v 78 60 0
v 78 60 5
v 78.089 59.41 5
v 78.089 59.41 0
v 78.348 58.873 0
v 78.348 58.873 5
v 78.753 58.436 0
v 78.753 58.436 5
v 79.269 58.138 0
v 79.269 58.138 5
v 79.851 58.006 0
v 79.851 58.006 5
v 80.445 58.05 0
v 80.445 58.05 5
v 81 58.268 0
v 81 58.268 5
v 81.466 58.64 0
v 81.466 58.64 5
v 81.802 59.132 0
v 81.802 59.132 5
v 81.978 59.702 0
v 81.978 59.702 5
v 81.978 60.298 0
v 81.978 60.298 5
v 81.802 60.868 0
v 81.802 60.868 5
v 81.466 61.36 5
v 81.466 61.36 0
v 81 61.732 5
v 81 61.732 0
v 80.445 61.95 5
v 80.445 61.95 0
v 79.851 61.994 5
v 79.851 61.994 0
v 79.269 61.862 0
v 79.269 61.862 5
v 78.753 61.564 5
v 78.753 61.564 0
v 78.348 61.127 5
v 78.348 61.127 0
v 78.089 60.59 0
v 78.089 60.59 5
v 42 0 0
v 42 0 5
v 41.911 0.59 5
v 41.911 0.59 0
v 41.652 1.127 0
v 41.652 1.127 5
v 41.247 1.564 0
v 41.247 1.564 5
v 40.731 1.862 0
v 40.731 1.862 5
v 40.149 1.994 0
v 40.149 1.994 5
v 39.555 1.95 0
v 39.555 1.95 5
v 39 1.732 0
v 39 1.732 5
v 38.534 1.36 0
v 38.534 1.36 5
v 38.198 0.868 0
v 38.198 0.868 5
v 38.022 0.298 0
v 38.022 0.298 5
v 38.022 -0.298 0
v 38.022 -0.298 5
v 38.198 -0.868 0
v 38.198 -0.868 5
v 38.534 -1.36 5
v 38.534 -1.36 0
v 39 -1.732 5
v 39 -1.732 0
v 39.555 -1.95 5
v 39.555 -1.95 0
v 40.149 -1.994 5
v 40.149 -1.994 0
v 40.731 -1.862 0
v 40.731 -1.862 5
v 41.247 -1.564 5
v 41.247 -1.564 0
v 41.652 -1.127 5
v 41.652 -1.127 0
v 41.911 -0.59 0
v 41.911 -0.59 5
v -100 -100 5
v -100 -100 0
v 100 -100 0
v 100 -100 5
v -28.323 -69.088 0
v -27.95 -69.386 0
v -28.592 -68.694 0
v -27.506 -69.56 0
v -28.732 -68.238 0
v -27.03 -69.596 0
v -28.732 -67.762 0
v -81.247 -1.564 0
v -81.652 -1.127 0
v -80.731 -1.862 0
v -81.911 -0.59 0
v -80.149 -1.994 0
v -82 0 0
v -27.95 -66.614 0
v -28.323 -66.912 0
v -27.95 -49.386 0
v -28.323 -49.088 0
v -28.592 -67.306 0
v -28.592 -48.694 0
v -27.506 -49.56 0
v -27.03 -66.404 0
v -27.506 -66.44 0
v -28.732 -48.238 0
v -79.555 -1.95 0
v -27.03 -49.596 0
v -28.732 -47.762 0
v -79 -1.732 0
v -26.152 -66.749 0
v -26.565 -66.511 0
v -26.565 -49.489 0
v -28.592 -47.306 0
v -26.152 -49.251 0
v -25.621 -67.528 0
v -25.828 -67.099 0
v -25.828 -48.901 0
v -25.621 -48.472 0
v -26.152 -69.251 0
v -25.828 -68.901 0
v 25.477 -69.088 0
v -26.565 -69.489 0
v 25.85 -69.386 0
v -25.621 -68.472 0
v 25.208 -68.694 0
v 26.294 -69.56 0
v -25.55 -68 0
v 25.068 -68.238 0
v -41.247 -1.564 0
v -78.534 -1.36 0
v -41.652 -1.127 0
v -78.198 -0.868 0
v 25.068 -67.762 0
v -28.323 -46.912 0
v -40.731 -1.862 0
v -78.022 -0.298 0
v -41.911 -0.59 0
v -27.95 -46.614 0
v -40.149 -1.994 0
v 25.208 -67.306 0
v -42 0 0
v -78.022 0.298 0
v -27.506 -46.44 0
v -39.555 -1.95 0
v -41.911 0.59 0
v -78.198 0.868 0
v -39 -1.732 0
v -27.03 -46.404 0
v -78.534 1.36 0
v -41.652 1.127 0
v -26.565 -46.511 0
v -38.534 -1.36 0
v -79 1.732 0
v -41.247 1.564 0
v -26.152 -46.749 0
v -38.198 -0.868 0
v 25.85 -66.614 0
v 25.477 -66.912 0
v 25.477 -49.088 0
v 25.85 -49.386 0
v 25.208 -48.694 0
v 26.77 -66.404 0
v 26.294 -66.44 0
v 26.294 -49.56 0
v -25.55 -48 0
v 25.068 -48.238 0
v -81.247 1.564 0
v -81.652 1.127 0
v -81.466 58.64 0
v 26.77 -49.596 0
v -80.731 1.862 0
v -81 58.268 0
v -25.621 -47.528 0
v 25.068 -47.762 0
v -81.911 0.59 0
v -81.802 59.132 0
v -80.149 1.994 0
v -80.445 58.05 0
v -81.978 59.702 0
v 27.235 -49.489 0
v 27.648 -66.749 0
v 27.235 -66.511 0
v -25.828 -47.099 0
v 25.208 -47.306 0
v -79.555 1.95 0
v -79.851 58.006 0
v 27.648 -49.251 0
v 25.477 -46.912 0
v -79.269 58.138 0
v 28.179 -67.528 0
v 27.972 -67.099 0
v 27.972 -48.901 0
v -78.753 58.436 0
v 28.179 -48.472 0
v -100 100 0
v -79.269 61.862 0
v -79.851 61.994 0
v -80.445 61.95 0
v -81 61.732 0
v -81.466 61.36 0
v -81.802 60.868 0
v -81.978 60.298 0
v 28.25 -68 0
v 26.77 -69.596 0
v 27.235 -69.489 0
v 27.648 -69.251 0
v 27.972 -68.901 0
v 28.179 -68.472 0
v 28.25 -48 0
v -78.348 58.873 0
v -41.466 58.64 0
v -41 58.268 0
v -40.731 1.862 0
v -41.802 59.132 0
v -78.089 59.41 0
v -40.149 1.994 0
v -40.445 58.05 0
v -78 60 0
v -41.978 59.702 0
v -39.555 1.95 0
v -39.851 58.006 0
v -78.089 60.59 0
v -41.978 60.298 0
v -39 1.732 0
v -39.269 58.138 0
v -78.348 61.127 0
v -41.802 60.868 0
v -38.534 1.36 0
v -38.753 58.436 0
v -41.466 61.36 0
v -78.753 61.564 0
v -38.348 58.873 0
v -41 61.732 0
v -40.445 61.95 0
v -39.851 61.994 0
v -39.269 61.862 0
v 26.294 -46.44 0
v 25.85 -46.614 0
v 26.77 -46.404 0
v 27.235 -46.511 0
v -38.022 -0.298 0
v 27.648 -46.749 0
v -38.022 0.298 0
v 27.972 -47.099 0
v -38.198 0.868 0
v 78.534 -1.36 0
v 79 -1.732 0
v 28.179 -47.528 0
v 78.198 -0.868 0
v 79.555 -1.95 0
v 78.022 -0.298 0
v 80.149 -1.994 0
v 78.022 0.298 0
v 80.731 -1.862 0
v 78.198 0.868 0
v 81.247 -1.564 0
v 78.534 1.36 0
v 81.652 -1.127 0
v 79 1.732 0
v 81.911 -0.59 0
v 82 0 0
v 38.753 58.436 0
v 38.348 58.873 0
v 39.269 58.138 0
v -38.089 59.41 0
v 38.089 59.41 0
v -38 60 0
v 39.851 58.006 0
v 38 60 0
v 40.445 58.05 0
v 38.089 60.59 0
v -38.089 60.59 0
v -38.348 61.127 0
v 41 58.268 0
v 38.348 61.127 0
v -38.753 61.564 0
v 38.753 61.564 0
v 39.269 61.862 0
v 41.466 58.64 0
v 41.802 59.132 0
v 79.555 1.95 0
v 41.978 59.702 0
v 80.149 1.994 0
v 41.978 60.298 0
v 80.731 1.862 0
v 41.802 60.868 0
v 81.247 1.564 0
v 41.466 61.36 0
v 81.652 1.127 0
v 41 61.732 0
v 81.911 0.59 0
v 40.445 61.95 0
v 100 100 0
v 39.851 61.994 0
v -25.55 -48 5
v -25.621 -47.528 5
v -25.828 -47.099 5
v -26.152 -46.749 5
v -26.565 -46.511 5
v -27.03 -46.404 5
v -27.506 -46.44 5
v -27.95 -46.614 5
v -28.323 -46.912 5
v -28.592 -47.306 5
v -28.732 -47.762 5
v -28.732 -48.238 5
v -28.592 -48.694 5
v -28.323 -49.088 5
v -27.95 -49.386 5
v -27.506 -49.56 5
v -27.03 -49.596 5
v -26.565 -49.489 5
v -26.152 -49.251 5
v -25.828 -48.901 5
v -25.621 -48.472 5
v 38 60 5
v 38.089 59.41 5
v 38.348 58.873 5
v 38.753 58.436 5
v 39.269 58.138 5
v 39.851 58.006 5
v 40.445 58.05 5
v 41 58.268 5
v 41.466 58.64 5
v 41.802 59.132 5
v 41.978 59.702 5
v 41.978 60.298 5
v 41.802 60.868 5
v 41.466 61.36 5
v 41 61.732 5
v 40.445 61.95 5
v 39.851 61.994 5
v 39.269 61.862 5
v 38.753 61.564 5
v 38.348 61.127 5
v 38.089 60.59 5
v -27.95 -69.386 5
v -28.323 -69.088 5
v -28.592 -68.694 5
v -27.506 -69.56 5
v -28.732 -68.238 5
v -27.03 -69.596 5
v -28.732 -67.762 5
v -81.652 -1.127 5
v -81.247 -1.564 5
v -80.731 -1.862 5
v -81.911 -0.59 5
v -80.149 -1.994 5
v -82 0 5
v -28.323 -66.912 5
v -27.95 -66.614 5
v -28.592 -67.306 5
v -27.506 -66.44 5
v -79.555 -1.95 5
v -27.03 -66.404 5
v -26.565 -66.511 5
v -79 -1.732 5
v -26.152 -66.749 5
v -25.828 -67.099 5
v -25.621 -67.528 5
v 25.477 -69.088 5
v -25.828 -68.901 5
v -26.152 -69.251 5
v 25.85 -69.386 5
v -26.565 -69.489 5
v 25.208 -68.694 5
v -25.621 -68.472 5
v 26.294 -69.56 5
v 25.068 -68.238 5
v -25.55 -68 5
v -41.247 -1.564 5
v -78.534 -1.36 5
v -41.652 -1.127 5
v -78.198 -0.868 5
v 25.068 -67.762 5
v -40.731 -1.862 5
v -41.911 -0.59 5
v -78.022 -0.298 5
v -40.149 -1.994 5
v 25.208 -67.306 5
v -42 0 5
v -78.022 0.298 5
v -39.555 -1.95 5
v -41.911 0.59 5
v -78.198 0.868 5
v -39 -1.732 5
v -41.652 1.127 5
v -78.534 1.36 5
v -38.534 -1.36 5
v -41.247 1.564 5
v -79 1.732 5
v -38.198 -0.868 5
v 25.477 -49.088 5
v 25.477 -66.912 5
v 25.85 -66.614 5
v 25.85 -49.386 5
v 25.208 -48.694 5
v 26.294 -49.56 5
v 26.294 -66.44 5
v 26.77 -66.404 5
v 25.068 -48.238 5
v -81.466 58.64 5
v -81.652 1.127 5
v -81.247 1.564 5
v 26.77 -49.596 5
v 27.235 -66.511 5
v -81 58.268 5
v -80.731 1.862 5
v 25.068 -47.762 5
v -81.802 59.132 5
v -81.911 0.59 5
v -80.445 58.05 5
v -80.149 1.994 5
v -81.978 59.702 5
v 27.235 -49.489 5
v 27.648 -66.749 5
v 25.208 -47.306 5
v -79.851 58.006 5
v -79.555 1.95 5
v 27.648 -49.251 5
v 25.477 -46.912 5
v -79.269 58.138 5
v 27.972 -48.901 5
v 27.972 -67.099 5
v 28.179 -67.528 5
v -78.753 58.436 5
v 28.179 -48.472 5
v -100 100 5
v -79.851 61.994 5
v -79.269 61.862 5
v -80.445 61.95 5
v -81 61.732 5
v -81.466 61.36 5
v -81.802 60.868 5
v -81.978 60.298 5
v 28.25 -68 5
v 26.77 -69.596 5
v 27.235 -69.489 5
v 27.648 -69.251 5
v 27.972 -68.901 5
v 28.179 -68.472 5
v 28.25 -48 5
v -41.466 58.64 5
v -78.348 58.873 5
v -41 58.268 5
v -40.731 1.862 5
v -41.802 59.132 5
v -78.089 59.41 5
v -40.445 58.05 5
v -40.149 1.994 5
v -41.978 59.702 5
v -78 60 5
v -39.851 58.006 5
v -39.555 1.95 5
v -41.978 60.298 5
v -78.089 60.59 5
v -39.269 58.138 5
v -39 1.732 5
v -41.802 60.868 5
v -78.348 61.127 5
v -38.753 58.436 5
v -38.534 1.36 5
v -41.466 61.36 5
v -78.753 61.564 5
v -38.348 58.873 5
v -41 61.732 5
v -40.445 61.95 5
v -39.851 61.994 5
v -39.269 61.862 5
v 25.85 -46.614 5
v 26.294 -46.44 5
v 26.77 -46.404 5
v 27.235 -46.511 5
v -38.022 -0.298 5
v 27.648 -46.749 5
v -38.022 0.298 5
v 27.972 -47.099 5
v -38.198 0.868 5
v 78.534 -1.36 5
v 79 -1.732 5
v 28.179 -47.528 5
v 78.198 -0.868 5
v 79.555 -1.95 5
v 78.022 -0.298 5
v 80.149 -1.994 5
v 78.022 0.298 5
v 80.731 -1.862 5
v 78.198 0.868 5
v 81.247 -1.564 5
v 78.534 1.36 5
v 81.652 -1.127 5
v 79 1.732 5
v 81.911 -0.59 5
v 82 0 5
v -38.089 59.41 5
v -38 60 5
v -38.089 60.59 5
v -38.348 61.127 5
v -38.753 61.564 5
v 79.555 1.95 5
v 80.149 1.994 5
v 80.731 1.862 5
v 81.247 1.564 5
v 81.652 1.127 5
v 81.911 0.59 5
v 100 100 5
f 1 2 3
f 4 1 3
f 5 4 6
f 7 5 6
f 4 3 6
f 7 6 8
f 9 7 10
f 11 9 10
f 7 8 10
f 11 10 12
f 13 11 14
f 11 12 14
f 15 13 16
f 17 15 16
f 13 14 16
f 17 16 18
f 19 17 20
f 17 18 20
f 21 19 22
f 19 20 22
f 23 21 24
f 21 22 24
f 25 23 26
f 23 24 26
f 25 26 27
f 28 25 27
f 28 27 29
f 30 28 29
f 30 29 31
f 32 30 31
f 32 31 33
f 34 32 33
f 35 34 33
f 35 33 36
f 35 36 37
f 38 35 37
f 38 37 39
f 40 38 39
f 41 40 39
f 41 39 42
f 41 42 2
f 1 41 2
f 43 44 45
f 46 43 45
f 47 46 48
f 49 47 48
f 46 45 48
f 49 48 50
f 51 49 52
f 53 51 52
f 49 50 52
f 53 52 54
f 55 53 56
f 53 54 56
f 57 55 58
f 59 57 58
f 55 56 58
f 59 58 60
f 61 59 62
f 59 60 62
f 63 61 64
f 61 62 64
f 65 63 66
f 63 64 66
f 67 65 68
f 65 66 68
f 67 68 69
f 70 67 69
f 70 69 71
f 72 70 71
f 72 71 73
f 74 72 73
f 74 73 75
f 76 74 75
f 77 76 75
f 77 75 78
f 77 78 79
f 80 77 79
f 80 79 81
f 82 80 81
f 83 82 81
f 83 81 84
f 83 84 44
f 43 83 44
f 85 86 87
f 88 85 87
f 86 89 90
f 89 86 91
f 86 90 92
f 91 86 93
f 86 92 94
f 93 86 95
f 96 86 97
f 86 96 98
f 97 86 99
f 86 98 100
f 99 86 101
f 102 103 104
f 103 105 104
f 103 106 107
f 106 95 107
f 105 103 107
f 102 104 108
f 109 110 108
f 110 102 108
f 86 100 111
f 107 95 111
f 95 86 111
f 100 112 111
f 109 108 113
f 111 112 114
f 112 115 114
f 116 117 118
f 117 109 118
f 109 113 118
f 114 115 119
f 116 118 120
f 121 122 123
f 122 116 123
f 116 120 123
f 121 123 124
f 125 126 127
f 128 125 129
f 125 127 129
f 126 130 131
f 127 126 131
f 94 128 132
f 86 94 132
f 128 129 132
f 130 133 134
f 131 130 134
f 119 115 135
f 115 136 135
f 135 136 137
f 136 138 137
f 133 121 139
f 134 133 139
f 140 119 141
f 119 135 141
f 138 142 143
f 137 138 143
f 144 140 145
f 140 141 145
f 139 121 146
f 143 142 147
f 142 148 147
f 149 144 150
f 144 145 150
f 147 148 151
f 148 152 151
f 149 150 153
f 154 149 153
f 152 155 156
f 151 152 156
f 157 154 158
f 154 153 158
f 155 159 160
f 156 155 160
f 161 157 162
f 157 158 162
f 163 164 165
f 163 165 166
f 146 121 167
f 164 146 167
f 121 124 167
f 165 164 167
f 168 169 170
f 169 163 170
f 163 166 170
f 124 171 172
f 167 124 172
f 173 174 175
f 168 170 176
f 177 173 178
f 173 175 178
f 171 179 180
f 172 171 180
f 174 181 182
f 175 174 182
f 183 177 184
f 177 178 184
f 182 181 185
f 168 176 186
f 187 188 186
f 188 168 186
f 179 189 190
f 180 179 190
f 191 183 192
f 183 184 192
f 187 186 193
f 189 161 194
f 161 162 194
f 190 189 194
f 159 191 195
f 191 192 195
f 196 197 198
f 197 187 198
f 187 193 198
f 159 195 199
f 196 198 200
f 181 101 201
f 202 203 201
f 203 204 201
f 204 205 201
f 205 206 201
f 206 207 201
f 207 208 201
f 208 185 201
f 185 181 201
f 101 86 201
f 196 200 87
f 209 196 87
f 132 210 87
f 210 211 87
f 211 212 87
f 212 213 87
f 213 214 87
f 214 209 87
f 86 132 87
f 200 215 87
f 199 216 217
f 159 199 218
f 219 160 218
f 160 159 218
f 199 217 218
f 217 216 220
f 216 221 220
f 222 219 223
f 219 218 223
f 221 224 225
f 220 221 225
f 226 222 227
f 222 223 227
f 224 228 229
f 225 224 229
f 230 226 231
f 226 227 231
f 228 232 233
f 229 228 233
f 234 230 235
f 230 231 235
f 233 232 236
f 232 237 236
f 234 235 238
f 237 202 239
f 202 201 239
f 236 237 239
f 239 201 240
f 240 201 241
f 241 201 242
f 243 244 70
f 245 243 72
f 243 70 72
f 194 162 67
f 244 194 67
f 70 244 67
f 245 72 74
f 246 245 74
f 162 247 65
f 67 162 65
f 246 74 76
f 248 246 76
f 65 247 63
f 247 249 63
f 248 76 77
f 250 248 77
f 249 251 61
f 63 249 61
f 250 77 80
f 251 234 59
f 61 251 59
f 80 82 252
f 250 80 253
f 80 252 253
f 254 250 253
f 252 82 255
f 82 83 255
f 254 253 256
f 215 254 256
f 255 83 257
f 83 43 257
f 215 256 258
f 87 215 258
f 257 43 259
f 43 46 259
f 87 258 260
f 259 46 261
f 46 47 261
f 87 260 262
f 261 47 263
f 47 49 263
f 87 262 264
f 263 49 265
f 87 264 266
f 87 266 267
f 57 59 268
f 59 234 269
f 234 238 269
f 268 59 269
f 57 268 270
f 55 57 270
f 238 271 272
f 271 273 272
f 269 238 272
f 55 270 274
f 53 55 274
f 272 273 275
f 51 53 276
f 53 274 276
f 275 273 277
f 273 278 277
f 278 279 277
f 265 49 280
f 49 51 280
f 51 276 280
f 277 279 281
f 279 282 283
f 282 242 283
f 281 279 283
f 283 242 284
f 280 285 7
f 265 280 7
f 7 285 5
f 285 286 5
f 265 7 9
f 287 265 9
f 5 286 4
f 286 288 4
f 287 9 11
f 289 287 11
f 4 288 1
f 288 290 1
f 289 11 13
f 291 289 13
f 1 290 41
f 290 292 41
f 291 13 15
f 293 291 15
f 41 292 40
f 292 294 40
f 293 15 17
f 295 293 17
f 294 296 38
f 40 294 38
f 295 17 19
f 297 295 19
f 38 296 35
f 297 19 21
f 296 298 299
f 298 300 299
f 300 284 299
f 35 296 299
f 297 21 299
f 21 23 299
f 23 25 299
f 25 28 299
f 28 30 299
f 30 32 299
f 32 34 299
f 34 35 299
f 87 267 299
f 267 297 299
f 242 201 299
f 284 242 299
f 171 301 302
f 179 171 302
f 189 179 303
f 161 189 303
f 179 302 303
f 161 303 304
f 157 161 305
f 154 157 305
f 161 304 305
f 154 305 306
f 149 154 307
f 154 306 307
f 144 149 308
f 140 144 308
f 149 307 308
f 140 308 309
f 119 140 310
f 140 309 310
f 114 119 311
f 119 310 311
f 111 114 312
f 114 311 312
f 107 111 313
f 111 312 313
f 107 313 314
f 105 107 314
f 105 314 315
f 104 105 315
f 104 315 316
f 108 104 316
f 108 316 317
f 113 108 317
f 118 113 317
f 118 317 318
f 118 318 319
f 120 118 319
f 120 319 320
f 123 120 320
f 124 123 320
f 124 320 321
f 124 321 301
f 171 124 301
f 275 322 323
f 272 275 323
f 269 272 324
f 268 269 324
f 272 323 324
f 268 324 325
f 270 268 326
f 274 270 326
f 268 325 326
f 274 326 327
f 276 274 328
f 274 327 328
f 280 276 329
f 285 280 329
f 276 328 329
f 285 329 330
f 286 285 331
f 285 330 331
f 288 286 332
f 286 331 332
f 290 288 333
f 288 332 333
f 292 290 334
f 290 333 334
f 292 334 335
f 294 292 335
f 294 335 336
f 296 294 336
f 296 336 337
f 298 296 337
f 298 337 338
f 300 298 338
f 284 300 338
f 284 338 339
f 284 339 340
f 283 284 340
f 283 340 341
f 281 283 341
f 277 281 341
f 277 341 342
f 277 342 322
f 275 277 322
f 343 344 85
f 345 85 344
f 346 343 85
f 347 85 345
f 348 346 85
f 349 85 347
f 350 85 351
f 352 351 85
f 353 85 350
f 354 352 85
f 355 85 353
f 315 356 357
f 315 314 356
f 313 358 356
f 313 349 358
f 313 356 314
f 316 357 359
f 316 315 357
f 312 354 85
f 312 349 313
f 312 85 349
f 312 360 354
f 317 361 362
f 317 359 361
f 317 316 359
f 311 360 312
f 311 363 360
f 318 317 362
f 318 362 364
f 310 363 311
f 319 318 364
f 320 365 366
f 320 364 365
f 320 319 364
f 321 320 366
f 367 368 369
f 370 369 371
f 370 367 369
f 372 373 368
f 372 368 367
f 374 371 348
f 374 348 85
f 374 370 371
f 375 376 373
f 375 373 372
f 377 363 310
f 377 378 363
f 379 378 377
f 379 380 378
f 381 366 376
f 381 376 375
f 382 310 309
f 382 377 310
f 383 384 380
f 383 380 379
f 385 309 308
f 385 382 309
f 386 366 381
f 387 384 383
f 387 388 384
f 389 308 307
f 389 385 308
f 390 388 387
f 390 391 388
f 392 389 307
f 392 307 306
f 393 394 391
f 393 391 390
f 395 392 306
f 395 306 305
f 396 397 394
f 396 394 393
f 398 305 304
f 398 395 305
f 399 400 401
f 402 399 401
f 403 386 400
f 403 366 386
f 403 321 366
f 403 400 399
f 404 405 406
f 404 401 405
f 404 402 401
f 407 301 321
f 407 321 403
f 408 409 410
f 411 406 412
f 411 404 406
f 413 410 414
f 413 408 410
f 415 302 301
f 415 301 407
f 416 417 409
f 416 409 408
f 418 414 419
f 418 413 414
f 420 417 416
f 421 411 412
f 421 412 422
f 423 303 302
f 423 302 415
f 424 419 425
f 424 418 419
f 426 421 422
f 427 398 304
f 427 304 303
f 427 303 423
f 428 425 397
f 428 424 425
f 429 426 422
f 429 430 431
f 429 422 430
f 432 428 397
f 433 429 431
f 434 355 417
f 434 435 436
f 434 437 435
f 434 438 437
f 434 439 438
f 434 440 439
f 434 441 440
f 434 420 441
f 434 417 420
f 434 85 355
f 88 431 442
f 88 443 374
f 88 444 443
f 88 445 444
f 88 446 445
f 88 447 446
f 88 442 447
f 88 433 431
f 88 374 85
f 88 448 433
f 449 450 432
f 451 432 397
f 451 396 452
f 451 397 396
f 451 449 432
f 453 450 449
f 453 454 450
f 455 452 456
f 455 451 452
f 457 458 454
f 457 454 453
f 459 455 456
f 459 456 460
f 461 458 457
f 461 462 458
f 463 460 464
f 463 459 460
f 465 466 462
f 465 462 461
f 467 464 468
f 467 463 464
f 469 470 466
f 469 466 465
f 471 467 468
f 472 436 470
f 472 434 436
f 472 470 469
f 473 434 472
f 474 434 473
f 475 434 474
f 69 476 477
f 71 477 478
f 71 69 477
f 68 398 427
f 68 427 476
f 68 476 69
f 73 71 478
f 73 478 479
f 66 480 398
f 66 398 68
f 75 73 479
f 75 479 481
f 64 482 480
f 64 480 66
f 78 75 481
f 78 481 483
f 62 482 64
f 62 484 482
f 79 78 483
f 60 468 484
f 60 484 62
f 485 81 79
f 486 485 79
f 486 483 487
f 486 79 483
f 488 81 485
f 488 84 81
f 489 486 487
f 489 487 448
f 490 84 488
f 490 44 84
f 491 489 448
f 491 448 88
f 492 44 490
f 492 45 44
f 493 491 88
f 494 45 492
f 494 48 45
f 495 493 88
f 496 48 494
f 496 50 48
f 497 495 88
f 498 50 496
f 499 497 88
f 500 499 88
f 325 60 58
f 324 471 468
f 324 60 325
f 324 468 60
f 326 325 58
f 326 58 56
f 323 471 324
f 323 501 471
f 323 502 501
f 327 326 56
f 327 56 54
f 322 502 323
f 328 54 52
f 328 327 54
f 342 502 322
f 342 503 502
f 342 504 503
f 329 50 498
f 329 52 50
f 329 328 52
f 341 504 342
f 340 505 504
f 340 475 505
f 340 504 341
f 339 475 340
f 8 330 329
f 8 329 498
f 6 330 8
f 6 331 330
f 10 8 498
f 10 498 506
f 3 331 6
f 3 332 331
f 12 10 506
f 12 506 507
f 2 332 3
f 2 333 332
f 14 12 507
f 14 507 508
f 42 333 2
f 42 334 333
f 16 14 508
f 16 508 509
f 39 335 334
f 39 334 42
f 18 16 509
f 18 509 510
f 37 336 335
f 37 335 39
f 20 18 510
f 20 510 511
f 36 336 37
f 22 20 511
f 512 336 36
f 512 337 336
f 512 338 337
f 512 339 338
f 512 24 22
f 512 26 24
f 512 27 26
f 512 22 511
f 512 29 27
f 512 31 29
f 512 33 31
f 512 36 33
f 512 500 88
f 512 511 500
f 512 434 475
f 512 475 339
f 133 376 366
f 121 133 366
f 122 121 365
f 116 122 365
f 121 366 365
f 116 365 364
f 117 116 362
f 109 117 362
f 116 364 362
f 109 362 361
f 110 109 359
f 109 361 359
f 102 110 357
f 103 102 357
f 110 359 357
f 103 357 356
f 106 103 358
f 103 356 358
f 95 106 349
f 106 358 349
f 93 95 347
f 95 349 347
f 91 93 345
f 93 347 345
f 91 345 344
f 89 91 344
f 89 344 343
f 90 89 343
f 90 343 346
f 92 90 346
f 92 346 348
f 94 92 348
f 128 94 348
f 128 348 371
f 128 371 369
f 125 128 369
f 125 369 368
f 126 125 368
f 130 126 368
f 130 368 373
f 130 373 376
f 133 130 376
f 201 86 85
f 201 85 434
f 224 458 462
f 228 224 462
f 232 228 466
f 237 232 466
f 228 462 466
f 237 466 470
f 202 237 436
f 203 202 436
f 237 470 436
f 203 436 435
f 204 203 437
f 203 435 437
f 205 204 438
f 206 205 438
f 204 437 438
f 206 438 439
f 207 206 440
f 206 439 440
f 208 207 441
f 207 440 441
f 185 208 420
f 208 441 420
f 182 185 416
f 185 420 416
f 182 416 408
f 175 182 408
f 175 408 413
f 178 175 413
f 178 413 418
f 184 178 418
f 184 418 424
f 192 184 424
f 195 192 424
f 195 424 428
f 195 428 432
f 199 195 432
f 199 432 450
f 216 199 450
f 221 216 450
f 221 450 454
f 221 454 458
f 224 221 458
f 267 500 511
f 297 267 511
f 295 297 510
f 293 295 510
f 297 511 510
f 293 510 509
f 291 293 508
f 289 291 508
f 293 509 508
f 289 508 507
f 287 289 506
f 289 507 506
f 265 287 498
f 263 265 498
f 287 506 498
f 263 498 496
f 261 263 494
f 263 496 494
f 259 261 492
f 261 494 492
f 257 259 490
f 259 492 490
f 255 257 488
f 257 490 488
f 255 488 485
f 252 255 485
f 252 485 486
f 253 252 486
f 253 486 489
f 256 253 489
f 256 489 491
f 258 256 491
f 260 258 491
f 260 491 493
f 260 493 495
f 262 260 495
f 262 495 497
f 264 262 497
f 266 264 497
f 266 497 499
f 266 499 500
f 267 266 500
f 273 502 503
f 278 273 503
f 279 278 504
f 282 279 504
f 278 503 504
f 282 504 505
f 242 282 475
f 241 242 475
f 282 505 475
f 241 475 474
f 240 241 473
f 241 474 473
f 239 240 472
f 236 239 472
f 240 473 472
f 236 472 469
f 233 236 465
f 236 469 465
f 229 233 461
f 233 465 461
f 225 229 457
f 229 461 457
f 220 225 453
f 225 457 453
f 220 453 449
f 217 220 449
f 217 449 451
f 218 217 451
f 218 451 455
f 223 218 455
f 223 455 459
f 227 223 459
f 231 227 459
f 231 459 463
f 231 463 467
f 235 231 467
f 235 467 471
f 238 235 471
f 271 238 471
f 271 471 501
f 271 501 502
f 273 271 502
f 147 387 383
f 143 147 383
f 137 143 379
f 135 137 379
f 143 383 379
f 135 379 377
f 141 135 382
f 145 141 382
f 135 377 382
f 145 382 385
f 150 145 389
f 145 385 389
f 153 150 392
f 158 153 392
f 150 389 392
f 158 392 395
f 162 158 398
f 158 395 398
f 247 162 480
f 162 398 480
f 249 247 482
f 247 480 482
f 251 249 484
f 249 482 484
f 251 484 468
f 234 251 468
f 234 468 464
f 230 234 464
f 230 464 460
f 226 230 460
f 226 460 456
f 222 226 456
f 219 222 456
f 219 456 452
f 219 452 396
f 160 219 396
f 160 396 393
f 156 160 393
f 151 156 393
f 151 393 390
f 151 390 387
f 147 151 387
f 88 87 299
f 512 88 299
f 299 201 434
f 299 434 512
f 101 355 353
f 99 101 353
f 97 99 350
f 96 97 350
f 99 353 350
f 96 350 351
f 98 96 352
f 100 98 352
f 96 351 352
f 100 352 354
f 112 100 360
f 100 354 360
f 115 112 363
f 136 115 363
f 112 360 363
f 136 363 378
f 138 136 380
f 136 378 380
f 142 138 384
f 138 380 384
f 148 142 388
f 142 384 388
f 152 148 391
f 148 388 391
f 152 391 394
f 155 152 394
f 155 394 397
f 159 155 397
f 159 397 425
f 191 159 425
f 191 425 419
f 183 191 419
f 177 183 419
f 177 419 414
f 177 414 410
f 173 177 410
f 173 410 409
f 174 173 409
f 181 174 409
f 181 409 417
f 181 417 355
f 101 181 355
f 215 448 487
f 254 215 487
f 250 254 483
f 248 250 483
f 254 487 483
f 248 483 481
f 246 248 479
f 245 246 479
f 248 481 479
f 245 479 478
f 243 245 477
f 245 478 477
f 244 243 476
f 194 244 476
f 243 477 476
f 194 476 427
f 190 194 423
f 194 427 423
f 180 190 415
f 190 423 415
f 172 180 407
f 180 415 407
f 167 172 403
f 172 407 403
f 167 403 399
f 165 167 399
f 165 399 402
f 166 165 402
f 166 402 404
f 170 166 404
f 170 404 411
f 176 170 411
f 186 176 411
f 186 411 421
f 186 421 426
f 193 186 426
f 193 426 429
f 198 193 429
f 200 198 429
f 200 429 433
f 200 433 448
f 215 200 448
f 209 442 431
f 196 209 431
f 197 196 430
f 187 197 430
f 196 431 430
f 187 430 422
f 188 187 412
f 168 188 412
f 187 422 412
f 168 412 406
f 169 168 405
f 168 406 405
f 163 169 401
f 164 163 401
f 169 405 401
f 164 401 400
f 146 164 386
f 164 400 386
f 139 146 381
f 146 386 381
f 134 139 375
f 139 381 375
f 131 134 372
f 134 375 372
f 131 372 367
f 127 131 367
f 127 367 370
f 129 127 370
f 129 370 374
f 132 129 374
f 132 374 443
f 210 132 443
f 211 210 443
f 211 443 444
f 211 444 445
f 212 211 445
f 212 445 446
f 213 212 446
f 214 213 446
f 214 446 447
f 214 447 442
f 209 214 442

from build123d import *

# Parameters (mm, degrees)
ESQUISSE1_W             = 200
ESQUISSE1_H             = 200
BOSS_EXTRU_1_DEPTH      = 5
ESQUISSE8_R             = 1.6
ENL_V_MAT_EXTRU_2_DEPTH = 142.509716981
ESQUISSE10_R            = 2
ENL_V_MAT_EXTRU_4_DEPTH = 142.509716981


with BuildPart() as part:
    # Esquisse1 → Boss.-Extru.1 (new body)
    with BuildSketch(Plane.XY):
        Rectangle(ESQUISSE1_W, ESQUISSE1_H)
    extrude(amount=BOSS_EXTRU_1_DEPTH)

    # Esquisse8 → Enlèv. mat.-Extru.2 (cut, through all)
    with BuildSketch(Plane.XY.offset(5)):
        with Locations((-27.15, -68)):
            Circle(ESQUISSE8_R)
        with Locations((-27.15, -48)):
            Circle(ESQUISSE8_R)
        with Locations((26.65, -48)):
            Circle(ESQUISSE8_R)
        with Locations((26.65, -68)):
            Circle(ESQUISSE8_R)
    extrude(amount=-ENL_V_MAT_EXTRU_2_DEPTH, mode=Mode.SUBTRACT)

    # Esquisse10 → Enlèv. mat.-Extru.4 (cut, through all)
    with BuildSketch(Plane.XY.offset(5)):
        with Locations((-80, 60)):
            Circle(ESQUISSE10_R)
        with Locations((-40, 60)):
            Circle(ESQUISSE10_R)
        with Locations(Location((-40, 0, 0), (0, 0, 180))):
            Circle(ESQUISSE10_R)
        with Locations(Location((-80, 0, 0), (0, 0, 180))):
            Circle(ESQUISSE10_R)
        with Locations((80, 0)):
            Circle(ESQUISSE10_R)
        with Locations((40, 0)):
            Circle(ESQUISSE10_R)
        with Locations(Location((40, 60, 0), (0, 0, 180))):
            Circle(ESQUISSE10_R)
        with Locations(Location((80, 60, 0), (0, 0, 180))):
            Circle(ESQUISSE10_R)
    extrude(amount=-ENL_V_MAT_EXTRU_4_DEPTH, mode=Mode.SUBTRACT)


solid = part.part
